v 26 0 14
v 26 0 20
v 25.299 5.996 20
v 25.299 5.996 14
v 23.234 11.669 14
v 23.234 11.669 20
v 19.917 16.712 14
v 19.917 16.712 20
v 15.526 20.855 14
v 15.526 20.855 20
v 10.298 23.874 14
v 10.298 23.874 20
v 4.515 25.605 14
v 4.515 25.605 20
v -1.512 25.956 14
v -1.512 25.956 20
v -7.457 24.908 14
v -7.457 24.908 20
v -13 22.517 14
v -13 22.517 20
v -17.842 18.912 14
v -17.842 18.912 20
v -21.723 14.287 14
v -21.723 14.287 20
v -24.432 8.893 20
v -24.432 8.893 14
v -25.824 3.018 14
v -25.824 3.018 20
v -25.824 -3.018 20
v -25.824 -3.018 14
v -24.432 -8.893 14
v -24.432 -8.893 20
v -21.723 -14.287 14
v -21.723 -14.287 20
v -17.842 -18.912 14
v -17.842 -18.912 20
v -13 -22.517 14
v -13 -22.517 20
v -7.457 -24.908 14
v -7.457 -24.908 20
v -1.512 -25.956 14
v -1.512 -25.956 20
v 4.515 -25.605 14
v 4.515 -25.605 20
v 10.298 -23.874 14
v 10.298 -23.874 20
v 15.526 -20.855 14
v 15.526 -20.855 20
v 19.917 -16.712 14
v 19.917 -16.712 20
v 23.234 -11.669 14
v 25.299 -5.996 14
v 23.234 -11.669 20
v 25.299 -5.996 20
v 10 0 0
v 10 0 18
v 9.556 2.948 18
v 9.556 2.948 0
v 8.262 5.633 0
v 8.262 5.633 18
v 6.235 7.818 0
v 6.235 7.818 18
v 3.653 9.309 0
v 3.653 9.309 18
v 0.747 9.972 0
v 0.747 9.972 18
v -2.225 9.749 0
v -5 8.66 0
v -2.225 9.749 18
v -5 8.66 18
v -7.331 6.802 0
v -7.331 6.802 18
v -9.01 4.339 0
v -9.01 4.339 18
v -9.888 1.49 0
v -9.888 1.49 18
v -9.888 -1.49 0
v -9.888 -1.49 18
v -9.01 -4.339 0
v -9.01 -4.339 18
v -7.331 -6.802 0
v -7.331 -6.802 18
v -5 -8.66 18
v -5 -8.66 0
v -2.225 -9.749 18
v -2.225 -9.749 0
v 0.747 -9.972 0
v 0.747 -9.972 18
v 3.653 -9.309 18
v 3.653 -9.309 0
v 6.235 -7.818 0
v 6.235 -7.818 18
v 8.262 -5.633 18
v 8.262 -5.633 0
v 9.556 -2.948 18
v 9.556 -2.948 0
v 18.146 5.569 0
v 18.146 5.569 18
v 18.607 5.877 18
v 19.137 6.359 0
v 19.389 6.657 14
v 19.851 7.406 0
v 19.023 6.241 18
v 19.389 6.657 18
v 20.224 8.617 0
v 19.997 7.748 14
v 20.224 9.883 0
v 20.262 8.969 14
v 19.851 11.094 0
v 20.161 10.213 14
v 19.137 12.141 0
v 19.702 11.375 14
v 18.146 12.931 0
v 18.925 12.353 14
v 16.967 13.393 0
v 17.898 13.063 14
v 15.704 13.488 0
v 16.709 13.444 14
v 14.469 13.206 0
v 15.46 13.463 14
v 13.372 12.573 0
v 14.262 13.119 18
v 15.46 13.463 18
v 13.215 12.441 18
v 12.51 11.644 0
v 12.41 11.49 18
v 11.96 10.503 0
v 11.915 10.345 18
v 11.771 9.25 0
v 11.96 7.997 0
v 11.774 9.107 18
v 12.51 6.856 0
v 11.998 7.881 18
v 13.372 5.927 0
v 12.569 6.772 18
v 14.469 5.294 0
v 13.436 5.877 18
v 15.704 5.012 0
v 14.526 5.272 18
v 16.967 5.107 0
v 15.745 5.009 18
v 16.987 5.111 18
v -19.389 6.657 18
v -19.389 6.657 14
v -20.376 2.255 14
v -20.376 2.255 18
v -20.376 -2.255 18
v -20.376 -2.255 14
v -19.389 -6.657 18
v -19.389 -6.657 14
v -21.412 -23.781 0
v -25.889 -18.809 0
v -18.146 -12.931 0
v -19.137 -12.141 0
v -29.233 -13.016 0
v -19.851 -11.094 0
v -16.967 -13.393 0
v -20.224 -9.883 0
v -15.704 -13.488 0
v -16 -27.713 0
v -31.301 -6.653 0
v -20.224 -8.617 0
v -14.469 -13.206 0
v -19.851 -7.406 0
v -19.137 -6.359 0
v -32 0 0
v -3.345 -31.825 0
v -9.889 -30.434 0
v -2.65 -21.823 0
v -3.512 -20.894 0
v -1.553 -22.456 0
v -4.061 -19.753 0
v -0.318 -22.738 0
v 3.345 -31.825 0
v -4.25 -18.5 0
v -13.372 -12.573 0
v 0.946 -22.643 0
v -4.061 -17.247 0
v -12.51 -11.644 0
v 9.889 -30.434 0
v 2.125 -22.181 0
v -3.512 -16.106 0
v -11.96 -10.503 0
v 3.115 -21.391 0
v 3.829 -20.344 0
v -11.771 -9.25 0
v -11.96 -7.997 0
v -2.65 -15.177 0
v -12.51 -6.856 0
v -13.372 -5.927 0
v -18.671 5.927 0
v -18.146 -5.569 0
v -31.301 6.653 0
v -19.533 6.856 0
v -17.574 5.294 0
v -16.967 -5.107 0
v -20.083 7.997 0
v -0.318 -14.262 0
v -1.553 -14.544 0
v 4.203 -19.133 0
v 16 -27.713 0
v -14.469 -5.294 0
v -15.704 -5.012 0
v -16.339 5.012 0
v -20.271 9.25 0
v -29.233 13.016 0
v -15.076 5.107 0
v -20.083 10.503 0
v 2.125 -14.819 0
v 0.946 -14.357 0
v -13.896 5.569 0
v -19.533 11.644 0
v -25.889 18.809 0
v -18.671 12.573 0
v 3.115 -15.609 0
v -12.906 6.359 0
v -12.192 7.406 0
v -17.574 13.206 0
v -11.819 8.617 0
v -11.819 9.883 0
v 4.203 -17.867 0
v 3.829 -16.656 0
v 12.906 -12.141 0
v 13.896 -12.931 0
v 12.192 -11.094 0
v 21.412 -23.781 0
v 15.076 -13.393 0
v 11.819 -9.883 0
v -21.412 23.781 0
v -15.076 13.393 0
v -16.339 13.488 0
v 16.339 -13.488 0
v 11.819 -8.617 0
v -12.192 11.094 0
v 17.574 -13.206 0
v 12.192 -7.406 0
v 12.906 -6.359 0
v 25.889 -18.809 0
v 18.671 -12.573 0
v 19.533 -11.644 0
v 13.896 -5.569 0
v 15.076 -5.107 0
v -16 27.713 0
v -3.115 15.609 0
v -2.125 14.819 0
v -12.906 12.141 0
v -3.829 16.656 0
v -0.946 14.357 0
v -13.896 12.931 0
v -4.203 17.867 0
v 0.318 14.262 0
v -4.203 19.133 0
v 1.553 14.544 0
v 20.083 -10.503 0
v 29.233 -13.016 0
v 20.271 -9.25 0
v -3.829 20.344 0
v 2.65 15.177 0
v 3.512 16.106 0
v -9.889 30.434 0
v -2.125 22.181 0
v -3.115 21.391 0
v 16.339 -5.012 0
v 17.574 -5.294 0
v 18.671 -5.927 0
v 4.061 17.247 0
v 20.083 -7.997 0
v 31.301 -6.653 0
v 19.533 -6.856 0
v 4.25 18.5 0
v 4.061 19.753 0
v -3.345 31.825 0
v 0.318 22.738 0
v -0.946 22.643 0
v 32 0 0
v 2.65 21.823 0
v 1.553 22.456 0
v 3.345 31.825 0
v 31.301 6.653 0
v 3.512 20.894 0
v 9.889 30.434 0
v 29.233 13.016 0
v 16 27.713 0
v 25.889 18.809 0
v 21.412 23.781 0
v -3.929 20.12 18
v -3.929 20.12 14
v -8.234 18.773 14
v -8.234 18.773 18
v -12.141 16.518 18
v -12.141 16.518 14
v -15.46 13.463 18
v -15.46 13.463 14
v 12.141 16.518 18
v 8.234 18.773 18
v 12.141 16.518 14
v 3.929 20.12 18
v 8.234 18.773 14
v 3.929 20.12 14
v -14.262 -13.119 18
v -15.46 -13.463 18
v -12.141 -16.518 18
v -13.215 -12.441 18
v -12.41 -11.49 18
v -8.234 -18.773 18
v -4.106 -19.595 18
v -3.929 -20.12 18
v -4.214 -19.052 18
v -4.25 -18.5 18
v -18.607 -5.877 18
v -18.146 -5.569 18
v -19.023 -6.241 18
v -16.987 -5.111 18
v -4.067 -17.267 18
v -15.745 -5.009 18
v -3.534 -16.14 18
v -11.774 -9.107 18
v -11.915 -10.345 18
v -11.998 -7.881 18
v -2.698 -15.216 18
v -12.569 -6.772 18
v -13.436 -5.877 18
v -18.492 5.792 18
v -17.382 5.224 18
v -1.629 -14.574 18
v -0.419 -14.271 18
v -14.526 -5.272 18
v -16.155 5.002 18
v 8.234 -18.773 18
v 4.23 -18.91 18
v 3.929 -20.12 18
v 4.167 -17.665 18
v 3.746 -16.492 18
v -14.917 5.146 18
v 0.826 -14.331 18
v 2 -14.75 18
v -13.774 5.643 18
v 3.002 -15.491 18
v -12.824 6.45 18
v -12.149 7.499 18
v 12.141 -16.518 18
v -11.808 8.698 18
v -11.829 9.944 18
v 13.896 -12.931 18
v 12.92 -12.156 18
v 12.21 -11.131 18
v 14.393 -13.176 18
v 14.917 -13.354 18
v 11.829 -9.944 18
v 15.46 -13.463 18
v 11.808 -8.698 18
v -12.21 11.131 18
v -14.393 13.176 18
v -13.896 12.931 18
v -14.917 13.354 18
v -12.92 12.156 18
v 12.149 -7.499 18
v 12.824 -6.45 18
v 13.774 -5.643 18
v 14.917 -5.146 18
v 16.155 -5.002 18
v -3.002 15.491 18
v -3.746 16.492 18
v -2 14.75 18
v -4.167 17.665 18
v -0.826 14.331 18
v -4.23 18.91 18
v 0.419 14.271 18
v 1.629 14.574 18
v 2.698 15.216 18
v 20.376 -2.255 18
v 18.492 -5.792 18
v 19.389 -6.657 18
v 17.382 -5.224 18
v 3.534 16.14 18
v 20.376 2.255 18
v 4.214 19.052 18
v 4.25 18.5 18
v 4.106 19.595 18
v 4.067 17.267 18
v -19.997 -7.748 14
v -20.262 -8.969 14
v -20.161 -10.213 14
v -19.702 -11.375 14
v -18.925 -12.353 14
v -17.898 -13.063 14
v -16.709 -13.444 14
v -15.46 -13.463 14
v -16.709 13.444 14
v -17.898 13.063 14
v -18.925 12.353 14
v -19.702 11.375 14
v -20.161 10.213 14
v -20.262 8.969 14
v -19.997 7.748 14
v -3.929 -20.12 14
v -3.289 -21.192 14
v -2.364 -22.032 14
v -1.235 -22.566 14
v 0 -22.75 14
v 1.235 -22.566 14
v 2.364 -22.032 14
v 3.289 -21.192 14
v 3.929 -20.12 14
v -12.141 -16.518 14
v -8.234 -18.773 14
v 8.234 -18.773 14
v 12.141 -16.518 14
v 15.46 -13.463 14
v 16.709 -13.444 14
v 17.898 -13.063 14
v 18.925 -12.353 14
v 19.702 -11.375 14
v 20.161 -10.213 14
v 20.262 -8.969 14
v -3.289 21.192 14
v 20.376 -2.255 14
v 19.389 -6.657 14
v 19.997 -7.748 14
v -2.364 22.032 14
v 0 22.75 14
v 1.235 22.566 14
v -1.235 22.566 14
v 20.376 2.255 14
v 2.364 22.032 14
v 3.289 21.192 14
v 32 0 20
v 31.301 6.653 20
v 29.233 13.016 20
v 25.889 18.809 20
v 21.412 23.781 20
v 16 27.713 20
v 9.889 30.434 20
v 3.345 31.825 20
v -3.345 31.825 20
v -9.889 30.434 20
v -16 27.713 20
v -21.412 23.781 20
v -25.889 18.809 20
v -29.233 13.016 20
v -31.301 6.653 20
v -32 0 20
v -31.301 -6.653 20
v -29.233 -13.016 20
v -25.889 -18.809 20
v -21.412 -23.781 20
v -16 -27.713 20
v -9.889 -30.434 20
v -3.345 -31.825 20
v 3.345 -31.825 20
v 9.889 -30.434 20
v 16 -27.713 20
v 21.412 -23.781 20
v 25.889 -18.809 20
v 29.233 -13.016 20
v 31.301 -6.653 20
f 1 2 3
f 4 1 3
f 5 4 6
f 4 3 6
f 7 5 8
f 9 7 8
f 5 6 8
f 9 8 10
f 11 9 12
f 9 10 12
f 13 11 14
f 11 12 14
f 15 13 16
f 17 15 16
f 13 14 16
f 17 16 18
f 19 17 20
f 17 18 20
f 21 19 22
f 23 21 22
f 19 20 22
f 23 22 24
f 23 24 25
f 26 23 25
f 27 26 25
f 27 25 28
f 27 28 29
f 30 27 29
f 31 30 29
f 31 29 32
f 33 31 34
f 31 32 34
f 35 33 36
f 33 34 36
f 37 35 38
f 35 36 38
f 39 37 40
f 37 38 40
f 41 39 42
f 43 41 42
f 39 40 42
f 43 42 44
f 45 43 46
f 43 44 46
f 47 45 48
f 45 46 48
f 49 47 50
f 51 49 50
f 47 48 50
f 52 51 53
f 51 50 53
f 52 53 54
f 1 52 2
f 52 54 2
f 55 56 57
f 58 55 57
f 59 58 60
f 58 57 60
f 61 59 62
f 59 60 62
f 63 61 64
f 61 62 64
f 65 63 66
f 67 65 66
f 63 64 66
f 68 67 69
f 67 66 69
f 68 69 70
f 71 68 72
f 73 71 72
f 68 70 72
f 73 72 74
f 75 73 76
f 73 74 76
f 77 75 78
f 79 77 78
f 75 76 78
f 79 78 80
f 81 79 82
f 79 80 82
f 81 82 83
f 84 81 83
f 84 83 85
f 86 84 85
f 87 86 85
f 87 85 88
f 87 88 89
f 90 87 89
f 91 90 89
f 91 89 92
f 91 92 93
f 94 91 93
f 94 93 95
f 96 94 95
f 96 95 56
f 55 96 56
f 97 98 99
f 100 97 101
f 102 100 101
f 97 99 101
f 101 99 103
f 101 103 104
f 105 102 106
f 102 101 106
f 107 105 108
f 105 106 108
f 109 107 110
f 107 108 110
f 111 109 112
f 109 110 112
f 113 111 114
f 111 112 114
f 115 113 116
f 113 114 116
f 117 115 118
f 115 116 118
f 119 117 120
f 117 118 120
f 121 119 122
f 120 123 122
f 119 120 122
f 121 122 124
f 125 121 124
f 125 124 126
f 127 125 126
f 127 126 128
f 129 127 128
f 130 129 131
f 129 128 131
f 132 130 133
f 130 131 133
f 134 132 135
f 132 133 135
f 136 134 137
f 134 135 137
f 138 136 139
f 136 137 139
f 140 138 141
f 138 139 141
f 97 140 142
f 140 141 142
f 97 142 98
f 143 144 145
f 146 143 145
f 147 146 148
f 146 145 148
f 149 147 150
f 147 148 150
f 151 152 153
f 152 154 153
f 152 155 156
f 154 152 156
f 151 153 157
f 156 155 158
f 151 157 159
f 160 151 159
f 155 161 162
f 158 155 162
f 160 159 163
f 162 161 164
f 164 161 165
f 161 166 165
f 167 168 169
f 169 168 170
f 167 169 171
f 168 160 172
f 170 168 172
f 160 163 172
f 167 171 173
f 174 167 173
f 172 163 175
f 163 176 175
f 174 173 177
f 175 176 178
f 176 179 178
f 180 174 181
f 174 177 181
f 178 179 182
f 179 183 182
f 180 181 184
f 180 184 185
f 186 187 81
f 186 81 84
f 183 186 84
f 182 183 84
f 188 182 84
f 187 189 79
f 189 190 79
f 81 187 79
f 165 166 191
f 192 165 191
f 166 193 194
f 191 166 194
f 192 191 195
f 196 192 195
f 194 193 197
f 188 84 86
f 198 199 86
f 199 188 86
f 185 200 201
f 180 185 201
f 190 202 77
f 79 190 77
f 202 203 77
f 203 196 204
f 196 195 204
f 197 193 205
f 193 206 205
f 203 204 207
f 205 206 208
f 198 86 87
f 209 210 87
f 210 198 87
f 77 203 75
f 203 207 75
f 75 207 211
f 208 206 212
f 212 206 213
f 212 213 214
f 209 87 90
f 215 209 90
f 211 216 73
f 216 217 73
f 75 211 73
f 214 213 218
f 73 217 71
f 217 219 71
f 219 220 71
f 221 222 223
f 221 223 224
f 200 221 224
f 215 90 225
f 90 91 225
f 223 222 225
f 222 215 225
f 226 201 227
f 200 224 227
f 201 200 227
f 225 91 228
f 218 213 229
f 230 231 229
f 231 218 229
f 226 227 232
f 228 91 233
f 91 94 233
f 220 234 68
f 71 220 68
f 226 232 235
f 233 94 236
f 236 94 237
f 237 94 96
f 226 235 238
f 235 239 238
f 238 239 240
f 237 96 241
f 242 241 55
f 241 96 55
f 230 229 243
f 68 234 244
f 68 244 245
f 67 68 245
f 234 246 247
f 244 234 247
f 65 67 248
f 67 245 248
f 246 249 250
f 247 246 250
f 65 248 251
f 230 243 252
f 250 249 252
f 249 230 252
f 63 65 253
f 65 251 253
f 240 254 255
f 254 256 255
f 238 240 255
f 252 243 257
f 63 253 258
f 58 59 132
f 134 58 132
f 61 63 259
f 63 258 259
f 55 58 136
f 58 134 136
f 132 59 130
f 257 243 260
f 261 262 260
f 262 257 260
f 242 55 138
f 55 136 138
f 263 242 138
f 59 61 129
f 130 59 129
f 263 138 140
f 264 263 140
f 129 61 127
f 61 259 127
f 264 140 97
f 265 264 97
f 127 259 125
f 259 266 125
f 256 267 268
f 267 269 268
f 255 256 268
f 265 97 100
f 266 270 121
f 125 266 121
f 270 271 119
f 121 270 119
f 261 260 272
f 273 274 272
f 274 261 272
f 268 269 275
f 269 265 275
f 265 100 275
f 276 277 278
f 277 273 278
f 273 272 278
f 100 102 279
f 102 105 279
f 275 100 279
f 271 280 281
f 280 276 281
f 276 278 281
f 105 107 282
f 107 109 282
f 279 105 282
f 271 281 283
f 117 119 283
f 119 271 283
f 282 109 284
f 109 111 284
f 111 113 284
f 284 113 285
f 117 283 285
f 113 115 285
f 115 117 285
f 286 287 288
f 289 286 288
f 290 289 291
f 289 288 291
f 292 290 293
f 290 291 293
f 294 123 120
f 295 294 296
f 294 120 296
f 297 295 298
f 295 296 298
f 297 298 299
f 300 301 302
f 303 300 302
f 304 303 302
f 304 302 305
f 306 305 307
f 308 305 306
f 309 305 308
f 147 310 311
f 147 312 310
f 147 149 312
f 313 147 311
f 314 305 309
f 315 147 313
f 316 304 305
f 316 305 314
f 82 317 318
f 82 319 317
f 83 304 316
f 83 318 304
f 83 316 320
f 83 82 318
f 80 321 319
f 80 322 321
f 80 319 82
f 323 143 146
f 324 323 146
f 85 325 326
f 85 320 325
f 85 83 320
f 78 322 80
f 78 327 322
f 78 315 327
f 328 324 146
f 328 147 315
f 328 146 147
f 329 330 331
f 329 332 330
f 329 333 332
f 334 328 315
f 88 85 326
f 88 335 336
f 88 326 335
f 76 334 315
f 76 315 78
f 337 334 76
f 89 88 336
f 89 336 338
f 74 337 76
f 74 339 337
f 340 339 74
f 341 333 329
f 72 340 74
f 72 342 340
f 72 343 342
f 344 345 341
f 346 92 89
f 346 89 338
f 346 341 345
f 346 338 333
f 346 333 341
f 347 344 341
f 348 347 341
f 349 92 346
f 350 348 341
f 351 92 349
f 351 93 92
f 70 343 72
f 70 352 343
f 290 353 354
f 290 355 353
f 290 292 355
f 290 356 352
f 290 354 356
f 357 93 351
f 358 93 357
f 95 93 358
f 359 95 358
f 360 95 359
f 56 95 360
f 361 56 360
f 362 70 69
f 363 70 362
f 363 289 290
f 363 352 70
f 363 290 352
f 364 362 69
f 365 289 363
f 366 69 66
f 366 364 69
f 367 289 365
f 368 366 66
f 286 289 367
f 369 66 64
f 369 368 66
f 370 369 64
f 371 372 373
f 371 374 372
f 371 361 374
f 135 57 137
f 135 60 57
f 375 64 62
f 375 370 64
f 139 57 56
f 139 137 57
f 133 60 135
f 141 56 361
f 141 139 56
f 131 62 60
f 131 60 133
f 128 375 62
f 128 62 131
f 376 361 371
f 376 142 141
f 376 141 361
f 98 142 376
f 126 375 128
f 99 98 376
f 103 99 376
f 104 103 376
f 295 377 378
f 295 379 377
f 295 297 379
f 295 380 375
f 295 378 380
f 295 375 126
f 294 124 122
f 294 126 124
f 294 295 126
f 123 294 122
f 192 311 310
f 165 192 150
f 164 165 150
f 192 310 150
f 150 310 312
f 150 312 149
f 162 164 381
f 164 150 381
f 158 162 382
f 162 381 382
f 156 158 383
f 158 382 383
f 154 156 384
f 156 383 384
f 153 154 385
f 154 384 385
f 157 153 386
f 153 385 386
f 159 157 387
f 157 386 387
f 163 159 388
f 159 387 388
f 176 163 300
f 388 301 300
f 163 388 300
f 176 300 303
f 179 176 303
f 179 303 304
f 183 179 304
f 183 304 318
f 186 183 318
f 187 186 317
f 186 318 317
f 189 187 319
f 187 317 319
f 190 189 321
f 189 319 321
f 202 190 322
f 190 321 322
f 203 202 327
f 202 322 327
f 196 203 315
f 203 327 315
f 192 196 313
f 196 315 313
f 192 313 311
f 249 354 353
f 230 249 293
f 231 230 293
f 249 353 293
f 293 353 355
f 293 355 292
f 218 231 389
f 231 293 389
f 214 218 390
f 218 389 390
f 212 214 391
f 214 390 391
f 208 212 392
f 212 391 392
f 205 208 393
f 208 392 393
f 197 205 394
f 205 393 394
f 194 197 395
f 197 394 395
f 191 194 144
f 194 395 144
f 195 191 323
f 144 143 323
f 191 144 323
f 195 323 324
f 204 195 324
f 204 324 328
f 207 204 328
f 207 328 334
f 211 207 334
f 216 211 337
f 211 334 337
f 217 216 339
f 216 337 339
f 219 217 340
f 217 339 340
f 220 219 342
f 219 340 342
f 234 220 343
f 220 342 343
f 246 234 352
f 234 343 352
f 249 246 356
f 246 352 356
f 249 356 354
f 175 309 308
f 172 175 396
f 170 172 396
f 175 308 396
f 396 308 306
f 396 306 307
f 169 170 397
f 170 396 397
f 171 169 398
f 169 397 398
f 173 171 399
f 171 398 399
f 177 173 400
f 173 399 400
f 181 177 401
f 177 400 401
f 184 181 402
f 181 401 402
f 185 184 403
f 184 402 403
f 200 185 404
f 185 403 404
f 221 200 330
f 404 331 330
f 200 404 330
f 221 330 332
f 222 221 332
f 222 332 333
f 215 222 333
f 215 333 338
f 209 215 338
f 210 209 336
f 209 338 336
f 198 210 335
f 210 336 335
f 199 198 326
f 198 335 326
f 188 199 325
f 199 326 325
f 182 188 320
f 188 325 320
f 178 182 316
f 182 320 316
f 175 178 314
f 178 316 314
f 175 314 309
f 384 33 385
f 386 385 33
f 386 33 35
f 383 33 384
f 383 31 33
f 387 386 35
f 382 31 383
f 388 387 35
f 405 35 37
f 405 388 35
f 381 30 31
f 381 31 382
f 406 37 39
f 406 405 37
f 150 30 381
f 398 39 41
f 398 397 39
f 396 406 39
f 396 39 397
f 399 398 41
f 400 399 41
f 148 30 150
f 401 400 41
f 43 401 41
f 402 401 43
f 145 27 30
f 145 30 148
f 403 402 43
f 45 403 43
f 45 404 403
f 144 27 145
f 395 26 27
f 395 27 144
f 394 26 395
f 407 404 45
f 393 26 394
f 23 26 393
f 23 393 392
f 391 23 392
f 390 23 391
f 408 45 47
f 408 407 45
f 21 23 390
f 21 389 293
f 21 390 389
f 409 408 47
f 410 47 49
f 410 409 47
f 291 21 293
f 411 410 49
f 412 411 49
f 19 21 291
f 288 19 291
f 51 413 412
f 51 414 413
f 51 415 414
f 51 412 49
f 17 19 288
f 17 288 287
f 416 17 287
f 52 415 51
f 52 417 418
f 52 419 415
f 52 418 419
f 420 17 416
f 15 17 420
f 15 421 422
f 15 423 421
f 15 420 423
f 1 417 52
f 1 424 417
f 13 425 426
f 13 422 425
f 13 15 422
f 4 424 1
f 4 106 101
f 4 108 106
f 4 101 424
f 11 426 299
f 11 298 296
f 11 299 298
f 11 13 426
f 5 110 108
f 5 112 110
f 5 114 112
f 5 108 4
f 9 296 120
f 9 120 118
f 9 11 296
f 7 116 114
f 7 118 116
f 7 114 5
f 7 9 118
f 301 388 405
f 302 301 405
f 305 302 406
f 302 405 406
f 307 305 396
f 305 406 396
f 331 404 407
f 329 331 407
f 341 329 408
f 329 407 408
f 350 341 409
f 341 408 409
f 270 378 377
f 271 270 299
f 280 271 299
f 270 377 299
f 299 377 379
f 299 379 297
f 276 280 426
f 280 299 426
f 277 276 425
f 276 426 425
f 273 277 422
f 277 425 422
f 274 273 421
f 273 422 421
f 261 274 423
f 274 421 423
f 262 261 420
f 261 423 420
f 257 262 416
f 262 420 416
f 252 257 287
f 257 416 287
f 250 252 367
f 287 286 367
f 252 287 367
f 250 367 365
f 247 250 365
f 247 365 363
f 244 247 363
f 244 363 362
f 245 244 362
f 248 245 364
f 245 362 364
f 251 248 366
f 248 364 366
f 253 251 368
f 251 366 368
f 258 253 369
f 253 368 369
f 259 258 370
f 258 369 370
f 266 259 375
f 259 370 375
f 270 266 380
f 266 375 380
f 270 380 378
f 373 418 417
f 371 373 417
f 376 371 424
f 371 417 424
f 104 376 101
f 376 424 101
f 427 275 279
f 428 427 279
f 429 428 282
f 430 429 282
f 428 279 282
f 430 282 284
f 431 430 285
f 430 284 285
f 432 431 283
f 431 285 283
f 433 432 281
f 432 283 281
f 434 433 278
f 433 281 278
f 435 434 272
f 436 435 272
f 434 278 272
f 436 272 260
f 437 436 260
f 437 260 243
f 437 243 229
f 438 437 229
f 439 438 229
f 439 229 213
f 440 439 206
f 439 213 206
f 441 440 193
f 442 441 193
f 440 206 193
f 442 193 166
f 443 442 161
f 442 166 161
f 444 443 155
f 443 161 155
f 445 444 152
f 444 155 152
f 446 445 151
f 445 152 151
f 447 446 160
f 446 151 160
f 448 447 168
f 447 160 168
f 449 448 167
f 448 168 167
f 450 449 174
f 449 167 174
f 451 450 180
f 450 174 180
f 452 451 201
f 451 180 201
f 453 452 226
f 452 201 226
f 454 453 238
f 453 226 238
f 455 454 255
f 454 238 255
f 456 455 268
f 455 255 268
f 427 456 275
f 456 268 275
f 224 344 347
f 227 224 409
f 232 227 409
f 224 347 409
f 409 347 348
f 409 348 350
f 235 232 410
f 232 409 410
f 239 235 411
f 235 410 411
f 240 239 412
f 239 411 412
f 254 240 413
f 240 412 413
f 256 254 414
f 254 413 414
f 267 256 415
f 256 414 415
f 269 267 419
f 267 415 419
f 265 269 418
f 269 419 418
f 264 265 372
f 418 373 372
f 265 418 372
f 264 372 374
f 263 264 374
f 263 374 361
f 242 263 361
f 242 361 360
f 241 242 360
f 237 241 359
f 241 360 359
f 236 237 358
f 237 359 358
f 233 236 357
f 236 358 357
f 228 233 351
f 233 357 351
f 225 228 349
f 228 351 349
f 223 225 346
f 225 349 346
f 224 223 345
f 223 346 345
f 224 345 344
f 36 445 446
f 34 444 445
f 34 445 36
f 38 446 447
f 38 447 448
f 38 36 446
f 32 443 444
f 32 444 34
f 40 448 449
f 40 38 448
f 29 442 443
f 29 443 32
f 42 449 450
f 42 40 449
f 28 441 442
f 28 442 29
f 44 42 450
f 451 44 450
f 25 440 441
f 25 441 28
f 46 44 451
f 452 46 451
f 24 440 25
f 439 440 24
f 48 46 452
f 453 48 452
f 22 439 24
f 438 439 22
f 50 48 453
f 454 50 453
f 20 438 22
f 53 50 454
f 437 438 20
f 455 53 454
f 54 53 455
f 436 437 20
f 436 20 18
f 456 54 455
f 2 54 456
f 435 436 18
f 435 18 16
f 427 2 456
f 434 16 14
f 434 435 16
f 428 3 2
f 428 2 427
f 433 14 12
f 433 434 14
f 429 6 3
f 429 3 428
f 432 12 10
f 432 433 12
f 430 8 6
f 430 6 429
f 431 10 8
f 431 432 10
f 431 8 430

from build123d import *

# Parameters (mm, degrees)
SKETCH1_R           = 32
BOSS_EXTRUDE1_DEPTH = 20
SKETCH2_R           = 26
CUT_EXTRUDE1_DEPTH  = 6
SKETCH3_R           = 20.5
BOSS_EXTRUDE2_DEPTH = 4
SKETCH4_R           = 10
CUT_EXTRUDE2_DEPTH  = 82
SKETCH5_R           = 4.25
CUT_EXTRUDE3_DEPTH  = 19
CIRPATTERN1_COUNT   = 6


with BuildPart() as part:
    # Sketch1 → Boss-Extrude1 (new body)
    with BuildSketch(Plane.XY):
        Circle(SKETCH1_R)
    extrude(amount=BOSS_EXTRUDE1_DEPTH)

    # Sketch2 → Cut-Extrude1 (cut)
    with BuildSketch(Plane.XY.offset(20)):
        Circle(SKETCH2_R)
    extrude(amount=-CUT_EXTRUDE1_DEPTH, mode=Mode.SUBTRACT)

    # Sketch3 → Boss-Extrude2 (add)
    with BuildSketch(Plane.XY.offset(14)):
        Circle(SKETCH3_R)
    extrude(amount=BOSS_EXTRUDE2_DEPTH)

    # Sketch4 → Cut-Extrude2 (cut)
    with BuildSketch(Plane.XY.offset(18)):
        Circle(SKETCH4_R)
    extrude(amount=-CUT_EXTRUDE2_DEPTH, mode=Mode.SUBTRACT)

    # Sketch5 → Cut-Extrude3 (cut, through all)
    with BuildSketch(Plane.XY.offset(18)):
        with Locations((0, 18.5)):
            Circle(SKETCH5_R)
    cut_extrude3 = extrude(amount=-CUT_EXTRUDE3_DEPTH, mode=Mode.SUBTRACT)

    # CirPattern1: Cut-Extrude3 ×6 about axis
    cirpattern1_axis = Axis((0, 0, 0), (0, 0, 1))
    for i in range(1, CIRPATTERN1_COUNT):
        add(cut_extrude3.rotate(cirpattern1_axis, i * 360 / CIRPATTERN1_COUNT), mode=Mode.SUBTRACT)


solid = part.part
